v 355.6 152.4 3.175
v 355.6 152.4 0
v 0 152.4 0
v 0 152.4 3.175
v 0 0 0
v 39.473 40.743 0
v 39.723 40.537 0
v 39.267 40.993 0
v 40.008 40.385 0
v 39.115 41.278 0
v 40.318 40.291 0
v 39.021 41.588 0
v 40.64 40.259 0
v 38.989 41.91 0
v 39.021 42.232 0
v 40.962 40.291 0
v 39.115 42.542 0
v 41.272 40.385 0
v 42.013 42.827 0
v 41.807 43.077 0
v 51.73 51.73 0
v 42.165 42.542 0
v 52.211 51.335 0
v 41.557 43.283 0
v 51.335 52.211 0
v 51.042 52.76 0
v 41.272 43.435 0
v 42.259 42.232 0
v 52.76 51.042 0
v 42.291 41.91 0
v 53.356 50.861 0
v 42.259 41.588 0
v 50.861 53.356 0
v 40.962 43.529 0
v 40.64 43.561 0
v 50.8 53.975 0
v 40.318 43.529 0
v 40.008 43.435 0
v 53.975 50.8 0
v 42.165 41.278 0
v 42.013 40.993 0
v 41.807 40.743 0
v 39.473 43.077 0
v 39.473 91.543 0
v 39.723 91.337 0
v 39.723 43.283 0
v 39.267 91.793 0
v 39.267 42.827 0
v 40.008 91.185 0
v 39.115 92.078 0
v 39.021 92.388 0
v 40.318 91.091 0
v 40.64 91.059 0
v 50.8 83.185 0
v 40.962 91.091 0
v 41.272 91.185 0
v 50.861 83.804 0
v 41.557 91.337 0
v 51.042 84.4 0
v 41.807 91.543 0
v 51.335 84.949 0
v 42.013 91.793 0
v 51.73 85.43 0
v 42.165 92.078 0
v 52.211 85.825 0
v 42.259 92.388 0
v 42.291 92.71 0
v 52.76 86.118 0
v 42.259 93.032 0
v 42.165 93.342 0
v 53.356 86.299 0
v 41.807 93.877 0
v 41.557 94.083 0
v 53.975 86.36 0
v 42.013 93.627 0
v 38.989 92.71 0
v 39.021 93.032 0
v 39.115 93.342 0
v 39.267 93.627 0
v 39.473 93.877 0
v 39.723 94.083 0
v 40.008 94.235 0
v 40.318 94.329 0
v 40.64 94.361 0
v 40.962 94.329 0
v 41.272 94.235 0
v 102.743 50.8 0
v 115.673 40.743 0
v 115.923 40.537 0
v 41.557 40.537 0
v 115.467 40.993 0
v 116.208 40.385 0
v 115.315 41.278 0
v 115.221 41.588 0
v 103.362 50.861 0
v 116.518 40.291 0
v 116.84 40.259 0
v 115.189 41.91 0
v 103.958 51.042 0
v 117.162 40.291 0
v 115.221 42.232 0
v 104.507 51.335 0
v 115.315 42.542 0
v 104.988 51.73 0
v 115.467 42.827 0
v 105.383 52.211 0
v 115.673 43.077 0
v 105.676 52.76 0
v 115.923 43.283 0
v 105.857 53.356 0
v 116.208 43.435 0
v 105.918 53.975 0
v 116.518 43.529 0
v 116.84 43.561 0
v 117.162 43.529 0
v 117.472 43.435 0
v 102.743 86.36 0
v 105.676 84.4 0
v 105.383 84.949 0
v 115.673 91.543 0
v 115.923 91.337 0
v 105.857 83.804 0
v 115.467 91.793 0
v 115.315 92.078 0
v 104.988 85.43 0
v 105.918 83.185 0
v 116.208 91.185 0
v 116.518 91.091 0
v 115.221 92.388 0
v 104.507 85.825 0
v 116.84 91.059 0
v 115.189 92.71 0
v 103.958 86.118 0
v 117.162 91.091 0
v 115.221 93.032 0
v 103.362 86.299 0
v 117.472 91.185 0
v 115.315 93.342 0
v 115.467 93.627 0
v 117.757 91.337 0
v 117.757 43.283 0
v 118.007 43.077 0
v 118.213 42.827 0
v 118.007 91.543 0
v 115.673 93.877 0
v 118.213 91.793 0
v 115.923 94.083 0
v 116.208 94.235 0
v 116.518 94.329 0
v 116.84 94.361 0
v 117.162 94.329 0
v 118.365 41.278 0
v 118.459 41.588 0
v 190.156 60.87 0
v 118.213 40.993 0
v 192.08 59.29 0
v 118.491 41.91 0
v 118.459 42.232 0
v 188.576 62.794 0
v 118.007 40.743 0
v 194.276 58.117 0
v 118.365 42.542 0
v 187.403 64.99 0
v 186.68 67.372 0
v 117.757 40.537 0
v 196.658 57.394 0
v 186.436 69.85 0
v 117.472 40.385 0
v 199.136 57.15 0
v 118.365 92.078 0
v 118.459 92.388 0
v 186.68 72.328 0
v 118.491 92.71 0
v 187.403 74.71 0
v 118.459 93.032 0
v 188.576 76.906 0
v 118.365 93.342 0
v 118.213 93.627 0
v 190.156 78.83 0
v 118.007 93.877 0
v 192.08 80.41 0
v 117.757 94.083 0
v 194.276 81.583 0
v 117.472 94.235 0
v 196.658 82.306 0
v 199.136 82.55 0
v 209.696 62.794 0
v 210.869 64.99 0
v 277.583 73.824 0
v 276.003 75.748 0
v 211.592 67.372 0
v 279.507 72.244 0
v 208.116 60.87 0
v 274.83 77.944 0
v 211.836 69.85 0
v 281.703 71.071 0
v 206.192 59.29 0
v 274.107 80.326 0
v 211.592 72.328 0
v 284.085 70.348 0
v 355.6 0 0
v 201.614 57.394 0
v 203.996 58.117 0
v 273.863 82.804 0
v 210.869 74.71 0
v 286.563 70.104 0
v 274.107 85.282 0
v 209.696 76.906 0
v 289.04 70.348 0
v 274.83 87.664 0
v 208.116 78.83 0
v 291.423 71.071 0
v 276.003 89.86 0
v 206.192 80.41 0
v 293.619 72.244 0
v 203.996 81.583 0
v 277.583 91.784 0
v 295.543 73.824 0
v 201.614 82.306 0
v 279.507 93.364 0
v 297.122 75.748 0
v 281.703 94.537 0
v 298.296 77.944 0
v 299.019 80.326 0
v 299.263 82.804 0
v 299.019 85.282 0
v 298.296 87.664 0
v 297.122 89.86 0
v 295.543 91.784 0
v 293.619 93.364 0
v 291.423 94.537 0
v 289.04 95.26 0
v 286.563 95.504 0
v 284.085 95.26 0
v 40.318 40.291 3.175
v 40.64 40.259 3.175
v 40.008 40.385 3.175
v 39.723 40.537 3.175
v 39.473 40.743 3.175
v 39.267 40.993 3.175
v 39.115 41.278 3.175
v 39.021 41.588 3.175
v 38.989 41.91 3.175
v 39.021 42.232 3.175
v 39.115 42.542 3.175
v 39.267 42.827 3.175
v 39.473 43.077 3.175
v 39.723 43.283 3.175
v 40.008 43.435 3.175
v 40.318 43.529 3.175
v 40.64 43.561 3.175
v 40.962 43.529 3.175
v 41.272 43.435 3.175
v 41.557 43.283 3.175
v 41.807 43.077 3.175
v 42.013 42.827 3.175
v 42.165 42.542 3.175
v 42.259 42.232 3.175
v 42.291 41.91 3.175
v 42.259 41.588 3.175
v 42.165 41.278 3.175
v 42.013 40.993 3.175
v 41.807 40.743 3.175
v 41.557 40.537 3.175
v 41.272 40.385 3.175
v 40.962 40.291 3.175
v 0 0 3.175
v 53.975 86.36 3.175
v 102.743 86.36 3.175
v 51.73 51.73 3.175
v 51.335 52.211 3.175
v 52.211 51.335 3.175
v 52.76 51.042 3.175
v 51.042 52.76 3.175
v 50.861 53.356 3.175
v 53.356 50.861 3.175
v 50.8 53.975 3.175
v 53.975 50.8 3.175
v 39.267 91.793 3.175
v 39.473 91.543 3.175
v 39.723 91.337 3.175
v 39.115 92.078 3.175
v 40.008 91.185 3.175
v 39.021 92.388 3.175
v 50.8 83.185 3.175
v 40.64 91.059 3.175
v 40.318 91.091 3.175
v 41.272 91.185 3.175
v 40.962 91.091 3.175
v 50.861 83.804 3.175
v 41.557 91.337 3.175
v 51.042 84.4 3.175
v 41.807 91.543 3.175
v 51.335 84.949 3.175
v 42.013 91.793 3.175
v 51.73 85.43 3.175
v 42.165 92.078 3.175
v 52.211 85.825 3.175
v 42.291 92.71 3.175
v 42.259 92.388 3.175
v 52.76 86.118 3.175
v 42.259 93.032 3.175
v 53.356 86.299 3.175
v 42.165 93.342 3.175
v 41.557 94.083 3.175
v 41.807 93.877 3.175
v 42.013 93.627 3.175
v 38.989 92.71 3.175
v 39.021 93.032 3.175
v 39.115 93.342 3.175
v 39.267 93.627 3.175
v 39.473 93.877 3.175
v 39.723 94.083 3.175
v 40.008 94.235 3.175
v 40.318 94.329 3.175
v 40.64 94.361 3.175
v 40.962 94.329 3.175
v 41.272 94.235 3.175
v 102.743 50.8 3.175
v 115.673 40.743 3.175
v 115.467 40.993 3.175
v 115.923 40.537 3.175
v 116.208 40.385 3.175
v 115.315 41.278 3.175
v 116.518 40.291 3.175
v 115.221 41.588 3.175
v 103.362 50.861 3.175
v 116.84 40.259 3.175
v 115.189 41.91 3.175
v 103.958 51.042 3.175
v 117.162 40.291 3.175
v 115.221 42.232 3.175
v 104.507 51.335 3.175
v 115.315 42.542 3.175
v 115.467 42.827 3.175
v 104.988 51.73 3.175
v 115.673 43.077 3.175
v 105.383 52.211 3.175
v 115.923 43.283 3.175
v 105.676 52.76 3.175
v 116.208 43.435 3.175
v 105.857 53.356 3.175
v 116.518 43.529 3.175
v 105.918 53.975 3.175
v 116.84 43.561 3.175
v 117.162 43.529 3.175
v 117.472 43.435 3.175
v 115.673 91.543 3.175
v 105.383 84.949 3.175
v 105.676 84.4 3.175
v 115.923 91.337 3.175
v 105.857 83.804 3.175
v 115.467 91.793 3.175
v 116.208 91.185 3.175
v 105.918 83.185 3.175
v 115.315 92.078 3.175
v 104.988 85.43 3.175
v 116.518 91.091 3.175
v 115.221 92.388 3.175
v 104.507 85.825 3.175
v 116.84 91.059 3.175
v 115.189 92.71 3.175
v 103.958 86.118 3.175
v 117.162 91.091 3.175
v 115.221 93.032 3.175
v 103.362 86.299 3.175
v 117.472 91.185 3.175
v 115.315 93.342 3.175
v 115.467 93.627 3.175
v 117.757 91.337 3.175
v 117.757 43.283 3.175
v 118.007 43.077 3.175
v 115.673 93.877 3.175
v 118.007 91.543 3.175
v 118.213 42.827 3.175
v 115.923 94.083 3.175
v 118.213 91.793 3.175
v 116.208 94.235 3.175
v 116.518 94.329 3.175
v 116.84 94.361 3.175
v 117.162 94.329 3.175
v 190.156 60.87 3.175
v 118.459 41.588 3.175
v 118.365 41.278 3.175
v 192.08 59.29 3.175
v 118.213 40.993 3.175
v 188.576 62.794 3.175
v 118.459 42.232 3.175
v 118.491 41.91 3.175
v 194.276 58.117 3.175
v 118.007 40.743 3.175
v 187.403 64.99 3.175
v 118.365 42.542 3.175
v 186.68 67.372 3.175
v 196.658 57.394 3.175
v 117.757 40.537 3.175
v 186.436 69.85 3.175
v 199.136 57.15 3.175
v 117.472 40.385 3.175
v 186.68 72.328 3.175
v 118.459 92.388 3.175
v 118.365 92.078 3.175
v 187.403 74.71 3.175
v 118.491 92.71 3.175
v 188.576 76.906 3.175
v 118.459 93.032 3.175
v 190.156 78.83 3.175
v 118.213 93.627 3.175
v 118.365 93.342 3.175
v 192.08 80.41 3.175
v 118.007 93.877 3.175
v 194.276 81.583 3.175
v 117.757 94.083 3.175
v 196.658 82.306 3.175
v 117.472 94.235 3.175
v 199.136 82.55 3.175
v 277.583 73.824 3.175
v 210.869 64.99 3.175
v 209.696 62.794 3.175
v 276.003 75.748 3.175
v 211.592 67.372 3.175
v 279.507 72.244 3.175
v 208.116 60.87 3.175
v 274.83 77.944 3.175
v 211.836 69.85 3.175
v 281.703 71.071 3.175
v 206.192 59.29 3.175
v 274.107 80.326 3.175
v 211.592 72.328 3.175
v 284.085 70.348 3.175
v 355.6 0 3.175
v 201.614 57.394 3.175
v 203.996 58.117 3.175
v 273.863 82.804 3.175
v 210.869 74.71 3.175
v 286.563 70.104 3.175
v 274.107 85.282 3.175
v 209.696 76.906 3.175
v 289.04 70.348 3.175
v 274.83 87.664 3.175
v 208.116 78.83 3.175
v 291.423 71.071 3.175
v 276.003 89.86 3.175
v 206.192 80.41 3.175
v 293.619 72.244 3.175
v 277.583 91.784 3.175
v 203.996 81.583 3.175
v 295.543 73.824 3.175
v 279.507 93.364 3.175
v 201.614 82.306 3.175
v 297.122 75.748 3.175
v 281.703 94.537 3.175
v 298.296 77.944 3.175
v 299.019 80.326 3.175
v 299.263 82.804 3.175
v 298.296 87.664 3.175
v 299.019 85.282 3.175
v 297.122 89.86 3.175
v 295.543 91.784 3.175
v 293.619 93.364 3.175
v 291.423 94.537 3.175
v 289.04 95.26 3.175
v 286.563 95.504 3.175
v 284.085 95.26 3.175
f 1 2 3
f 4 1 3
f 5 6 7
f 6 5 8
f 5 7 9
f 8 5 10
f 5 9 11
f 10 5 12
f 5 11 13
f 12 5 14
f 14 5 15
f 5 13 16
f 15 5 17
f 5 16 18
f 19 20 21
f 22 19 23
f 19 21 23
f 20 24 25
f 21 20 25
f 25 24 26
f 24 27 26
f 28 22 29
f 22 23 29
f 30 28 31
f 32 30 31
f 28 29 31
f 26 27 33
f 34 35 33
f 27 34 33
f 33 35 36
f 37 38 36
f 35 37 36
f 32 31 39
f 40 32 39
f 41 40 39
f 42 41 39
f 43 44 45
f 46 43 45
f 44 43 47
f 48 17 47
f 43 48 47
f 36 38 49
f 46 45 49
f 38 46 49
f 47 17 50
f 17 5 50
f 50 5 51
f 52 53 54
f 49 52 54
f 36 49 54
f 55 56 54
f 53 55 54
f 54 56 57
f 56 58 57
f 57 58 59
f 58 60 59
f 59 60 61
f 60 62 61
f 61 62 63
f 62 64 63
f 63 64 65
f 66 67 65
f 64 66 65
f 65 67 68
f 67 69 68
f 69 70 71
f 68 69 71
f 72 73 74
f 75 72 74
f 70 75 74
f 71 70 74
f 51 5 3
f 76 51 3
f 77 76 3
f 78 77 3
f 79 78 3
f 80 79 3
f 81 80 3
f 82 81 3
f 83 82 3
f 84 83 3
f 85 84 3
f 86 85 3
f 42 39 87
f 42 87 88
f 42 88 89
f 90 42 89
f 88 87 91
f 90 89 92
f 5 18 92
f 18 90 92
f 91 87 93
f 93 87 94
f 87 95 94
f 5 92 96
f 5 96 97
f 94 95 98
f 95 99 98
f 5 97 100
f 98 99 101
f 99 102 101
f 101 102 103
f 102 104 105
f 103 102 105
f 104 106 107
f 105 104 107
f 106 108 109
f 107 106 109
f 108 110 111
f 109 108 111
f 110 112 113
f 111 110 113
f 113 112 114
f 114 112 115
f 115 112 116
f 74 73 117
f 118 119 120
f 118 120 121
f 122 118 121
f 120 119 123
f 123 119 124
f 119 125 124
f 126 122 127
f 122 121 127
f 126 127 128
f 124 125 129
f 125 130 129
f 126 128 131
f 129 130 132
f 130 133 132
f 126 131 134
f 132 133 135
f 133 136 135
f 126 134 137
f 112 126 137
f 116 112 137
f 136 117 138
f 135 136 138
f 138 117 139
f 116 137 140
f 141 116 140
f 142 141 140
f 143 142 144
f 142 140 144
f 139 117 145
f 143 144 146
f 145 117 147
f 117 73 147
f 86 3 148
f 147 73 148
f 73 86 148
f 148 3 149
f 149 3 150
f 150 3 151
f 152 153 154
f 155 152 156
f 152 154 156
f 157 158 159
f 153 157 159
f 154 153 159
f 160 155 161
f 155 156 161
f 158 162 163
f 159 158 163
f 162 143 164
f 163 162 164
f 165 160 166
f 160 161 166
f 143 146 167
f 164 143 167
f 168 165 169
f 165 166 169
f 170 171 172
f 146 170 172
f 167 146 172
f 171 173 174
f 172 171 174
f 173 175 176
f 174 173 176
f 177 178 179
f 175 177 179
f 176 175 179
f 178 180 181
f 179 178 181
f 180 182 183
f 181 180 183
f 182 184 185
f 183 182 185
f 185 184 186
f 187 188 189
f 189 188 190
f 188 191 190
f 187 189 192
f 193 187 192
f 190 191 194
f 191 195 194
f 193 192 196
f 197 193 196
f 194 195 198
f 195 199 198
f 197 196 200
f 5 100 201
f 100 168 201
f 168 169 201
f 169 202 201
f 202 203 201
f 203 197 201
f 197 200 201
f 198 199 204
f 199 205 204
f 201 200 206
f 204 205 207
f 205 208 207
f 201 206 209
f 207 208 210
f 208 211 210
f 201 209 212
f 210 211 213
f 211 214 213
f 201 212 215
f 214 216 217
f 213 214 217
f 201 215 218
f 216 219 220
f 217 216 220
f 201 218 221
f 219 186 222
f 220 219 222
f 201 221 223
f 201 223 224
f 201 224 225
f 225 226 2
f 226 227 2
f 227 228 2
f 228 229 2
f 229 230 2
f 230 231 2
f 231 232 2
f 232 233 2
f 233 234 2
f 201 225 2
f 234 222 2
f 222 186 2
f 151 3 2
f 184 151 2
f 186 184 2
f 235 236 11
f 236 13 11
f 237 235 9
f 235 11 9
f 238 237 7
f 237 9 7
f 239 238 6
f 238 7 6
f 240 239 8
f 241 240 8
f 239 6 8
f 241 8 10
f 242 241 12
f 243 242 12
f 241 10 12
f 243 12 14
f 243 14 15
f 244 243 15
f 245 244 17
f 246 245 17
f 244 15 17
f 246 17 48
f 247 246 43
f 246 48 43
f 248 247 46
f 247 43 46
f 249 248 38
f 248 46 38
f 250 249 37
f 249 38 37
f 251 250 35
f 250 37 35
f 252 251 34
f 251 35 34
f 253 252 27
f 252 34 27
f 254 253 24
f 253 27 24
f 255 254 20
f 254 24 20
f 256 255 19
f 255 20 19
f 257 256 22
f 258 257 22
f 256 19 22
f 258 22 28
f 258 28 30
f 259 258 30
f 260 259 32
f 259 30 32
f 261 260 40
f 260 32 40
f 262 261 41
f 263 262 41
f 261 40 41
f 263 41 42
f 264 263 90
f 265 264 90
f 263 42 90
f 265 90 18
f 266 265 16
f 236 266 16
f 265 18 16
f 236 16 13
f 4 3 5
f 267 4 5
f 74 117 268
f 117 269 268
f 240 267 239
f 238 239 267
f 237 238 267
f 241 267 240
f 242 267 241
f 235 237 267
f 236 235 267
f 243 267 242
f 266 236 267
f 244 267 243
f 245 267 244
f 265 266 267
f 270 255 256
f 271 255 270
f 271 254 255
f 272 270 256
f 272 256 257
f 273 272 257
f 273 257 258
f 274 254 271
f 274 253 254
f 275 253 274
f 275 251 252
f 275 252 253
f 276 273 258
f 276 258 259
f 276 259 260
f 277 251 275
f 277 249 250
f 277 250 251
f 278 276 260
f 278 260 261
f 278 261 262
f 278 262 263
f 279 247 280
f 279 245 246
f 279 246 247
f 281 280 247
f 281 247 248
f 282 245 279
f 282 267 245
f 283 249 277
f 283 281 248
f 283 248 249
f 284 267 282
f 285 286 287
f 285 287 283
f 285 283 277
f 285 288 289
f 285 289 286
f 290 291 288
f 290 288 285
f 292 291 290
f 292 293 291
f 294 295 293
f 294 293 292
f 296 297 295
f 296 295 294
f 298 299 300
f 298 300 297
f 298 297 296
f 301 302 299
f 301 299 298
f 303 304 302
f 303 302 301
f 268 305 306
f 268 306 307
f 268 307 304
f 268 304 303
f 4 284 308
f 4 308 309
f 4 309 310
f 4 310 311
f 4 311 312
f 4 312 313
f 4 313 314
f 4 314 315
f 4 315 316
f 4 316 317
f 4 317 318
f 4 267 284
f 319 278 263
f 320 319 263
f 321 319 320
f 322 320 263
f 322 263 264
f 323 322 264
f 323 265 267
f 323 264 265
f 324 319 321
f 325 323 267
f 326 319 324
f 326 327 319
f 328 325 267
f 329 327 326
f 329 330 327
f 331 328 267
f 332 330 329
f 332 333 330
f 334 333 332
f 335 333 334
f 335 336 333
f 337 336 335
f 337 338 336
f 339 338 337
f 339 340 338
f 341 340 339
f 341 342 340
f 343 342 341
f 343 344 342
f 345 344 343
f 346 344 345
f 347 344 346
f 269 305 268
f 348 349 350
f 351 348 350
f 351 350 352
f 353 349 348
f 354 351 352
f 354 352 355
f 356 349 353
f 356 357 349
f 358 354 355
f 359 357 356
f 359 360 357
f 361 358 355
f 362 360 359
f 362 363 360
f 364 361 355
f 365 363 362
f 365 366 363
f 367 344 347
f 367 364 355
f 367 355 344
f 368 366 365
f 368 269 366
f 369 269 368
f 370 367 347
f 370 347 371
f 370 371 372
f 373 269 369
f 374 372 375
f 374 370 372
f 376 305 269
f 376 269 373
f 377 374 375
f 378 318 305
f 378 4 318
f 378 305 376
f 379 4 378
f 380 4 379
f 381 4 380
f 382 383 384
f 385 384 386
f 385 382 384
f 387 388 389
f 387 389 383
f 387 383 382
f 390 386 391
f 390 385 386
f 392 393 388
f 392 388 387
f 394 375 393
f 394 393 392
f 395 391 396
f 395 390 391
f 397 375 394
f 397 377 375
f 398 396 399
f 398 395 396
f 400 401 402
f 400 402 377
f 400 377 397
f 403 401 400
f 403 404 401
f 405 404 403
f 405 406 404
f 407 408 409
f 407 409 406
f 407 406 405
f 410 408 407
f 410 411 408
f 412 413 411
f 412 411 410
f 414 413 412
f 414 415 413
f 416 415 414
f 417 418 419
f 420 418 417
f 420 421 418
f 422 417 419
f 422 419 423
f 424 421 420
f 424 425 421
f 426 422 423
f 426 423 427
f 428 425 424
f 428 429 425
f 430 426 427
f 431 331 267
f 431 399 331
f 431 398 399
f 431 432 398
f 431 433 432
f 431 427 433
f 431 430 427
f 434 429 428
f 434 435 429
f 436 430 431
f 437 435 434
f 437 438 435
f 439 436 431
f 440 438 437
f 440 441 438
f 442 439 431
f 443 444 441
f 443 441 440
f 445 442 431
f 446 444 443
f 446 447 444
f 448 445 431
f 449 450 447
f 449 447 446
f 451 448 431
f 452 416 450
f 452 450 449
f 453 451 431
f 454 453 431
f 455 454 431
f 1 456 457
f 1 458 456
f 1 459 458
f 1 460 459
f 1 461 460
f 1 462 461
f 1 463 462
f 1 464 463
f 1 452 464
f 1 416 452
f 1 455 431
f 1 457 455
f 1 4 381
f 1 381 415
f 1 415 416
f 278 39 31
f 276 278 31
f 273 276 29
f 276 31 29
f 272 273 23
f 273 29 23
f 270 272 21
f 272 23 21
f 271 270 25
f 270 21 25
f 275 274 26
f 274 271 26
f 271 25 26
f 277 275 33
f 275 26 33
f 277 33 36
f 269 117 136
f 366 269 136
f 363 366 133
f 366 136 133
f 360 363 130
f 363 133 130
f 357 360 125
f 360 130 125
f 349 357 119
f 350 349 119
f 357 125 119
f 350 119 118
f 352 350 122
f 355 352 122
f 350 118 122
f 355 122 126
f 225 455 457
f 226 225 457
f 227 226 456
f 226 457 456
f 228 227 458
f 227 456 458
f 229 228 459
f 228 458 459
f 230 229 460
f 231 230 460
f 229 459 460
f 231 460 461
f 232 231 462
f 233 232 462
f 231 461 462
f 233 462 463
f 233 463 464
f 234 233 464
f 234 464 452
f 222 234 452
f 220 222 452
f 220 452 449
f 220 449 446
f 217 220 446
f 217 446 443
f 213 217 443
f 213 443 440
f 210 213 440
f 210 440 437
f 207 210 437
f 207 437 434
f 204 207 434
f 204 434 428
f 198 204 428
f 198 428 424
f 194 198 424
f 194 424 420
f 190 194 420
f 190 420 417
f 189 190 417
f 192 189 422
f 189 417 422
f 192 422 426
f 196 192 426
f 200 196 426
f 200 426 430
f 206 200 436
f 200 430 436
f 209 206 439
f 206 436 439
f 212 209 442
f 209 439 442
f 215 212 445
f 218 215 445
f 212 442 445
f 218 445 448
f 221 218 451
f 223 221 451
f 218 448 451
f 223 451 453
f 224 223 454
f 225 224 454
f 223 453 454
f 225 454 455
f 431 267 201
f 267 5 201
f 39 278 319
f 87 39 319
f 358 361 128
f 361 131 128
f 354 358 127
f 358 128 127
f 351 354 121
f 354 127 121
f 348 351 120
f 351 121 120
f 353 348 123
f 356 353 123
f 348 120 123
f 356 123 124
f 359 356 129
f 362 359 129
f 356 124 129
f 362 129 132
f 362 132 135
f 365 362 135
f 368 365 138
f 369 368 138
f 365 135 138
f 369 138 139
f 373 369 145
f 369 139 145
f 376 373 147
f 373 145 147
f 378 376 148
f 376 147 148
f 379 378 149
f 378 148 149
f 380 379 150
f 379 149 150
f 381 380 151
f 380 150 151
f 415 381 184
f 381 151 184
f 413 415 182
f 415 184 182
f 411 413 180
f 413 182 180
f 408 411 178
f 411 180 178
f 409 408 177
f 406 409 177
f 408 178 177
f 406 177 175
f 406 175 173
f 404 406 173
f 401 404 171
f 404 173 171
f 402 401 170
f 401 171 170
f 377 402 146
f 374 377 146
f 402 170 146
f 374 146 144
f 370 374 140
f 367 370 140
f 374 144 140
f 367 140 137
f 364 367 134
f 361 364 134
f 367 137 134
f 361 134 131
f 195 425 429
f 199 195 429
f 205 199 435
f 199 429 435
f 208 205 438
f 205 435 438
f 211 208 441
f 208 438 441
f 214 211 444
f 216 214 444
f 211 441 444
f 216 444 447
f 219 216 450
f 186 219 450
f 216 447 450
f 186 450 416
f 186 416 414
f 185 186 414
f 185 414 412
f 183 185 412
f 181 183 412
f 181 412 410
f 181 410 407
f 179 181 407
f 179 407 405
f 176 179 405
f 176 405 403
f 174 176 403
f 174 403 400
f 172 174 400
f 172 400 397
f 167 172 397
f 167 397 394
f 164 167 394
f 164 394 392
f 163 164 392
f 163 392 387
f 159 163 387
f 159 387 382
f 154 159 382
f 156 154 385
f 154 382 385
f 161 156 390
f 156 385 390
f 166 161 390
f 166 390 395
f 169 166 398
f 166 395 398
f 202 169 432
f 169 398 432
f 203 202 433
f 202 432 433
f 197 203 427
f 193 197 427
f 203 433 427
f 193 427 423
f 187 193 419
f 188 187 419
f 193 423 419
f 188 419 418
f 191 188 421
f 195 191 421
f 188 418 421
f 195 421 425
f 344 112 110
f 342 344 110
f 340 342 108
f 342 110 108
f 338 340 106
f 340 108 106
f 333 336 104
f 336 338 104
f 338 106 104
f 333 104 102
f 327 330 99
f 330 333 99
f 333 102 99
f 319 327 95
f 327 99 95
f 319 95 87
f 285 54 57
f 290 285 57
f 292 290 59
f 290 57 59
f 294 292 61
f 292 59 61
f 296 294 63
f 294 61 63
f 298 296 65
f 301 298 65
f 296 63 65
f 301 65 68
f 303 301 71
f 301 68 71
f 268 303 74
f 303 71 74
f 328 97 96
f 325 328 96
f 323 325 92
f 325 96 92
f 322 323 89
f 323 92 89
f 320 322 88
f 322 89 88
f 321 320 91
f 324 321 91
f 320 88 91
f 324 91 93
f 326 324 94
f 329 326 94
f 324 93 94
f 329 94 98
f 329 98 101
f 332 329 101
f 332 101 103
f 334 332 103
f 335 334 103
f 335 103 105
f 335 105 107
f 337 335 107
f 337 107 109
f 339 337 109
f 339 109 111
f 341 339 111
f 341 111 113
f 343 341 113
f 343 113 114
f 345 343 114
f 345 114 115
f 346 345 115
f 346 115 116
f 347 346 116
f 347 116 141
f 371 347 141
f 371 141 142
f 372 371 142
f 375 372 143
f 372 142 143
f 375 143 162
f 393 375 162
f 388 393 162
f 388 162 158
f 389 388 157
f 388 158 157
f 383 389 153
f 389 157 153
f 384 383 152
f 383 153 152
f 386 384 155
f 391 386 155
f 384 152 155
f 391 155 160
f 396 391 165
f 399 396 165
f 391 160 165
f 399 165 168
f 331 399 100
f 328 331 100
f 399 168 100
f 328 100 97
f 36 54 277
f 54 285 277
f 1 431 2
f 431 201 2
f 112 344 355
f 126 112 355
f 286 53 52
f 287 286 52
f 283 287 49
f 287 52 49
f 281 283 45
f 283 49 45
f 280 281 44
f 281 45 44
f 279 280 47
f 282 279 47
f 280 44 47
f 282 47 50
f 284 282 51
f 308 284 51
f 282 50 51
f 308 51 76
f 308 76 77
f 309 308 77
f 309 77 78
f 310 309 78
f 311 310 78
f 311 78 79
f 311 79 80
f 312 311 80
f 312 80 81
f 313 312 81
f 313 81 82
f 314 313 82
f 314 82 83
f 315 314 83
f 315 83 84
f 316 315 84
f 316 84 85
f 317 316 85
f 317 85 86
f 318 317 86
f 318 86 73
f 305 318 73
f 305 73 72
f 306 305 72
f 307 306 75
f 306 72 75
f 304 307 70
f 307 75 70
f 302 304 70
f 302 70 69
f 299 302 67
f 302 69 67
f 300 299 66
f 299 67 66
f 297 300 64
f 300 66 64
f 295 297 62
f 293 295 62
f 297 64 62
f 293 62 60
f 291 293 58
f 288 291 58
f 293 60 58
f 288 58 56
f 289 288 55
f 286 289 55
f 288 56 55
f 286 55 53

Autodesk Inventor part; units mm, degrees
ref_plane "YZ Plane" through (0, 0, 0) normal (1, 0, 0) x (0, 1, 0)
ref_plane "XZ Plane" through (0, 0, 0) normal (0, 1, 0) x (-1, 0, 0)
ref_plane "XY Plane" through (0, 0, 0) normal (0, 0, 1) x (1, 0, 0)
sketch "Sketch1" plane through (0, 0, 0) normal (0, 0, 1) x (1, 0, 0)
  line L0 (0, 0) -> (355.6, 0)
  line L1 (355.6, 0) -> (355.6, 152.4)
  line L2 (355.6, 152.4) -> (0, 152.4)
  line L3 (0, 152.4) -> (0, 0)
  dimension "d0" = 152.4
  dimension "d1" = 355.6
extrude "Extrusion1" add sketch "Sketch1" along normal blind 3.175
sketch "Sketch2" plane through (0, 0, 3.175) normal (0, 0, 1) x (1, 0, 0)
  line L0 (50.8, 50.8) -> (105.918, 50.8)
  line L1 (105.918, 50.8) -> (105.918, 86.36)
  line L2 (105.918, 86.36) -> (50.8, 86.36)
  line L3 (50.8, 86.36) -> (50.8, 50.8)
  line L4 (0, 152.4) -> (0, 0) projected
  line L5 (0, 0) -> (355.6, 0) projected
  dimension "d4" = 55.118
  dimension "d5" = 35.56
  dimension "d6" = 50.8
  dimension "d7" = 50.8
extrude "Extrusion2" cut sketch "Sketch2" against normal blind 3.175
sketch "Sketch3" plane through (0, 0, 3.175) normal (0, 0, 1) x (1, 0, 0)
  circle A0 centre (199.136, 69.85) radius 12.7
  circle A1 centre (286.5628, 82.804) radius 12.7
  line L0 (0, 0) -> (355.6, 0) projected
  line L1 (0, 152.4) -> (0, 0) projected
  line L2 (355.6, 0) -> (355.6, 152.4) projected
  dimension "d10" = 25.4
  dimension "d11" = 25.4
  dimension "d12" = 69.85
  dimension "d13" = 82.804
  dimension "d14" = 199.136
  dimension "d15" = 69.0372
extrude "Extrusion3" cut sketch "Sketch3" against normal blind 3.175
sketch "Sketch4" plane through (0, 0, 3.175) normal (0, 0, 1) x (1, 0, 0)
  line L0 (0, 0) -> (355.6, 0) projected
  line L1 (0, 152.4) -> (0, 0) projected
  point P0 (40.64, 41.91)
  point P1 (116.84, 41.91)
  point P2 (116.84, 92.71)
  point P3 (40.64, 92.71)
  dimension "d18" = 41.91
  dimension "d19" = 41.91
  dimension "d20" = 92.71
  dimension "d21" = 92.71
  dimension "d22" = 40.64
  dimension "d23" = 116.84
  dimension "d24" = 40.64
  dimension "d25" = 116.84
hole "Hole1" at (40.64, 41.91, 3.175) at (116.84, 41.91, 3.175) at (116.84, 92.71, 3.175) at (40.64, 92.71, 3.175) direction (0, 0, -1) diameter 3.302 end through all thread size "8-32 UNC" class "2B" standard "ANSI Unified Screw Threads"
fillet "Fillet1" radius 3.175 4 edges at (50.8, 50.8, 1.5875) (105.918, 86.36, 1.5875) (105.918, 50.8, 1.5875) (50.8, 86.36, 1.5875)
equation "\"d19\" = d18"
equation "\"d21\" = d20"
equation "\"d24\" = d22"
equation "\"d25\" = d23"
properties part number "LFEV2017_TSI_003"
